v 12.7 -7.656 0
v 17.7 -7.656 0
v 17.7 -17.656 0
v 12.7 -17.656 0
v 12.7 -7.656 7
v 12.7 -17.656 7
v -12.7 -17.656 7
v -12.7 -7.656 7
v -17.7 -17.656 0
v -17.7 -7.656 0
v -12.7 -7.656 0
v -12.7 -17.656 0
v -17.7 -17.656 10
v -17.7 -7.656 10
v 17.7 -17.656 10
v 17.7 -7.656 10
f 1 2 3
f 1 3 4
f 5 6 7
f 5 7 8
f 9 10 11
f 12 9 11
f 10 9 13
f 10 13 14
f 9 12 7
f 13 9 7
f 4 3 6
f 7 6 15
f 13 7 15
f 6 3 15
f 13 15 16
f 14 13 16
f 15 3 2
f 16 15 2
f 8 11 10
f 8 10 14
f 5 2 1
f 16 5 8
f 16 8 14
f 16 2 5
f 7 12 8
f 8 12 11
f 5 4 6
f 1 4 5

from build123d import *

# Parameters (mm, degrees)
F0_W     = 5
F0_H     = 10
F1_DEPTH = 10
F2_W     = 10
F2_H     = 3
F3_DEPTH = 12.7


with BuildPart() as f1:
    # F0 (on Top) → F1 (new body)
    with BuildSketch(Plane.XY):
        with Locations((-15.2, -12.655717)):
            Rectangle(F0_W, F0_H)
    extrude(amount=F1_DEPTH)

    # F2 (on face) → F3 (join, through all)
    with BuildSketch(Plane.YZ.offset(-12.7)):
        with Locations((-12.655717, 8.5)):
            Rectangle(F2_W, F2_H)
    extrude(amount=F3_DEPTH)

    # F4: F1 across plane


with BuildPart() as f1_1:
    add(f1.part)
    add(f1.part.mirror(Plane.YZ))


solid = f1_1.part
